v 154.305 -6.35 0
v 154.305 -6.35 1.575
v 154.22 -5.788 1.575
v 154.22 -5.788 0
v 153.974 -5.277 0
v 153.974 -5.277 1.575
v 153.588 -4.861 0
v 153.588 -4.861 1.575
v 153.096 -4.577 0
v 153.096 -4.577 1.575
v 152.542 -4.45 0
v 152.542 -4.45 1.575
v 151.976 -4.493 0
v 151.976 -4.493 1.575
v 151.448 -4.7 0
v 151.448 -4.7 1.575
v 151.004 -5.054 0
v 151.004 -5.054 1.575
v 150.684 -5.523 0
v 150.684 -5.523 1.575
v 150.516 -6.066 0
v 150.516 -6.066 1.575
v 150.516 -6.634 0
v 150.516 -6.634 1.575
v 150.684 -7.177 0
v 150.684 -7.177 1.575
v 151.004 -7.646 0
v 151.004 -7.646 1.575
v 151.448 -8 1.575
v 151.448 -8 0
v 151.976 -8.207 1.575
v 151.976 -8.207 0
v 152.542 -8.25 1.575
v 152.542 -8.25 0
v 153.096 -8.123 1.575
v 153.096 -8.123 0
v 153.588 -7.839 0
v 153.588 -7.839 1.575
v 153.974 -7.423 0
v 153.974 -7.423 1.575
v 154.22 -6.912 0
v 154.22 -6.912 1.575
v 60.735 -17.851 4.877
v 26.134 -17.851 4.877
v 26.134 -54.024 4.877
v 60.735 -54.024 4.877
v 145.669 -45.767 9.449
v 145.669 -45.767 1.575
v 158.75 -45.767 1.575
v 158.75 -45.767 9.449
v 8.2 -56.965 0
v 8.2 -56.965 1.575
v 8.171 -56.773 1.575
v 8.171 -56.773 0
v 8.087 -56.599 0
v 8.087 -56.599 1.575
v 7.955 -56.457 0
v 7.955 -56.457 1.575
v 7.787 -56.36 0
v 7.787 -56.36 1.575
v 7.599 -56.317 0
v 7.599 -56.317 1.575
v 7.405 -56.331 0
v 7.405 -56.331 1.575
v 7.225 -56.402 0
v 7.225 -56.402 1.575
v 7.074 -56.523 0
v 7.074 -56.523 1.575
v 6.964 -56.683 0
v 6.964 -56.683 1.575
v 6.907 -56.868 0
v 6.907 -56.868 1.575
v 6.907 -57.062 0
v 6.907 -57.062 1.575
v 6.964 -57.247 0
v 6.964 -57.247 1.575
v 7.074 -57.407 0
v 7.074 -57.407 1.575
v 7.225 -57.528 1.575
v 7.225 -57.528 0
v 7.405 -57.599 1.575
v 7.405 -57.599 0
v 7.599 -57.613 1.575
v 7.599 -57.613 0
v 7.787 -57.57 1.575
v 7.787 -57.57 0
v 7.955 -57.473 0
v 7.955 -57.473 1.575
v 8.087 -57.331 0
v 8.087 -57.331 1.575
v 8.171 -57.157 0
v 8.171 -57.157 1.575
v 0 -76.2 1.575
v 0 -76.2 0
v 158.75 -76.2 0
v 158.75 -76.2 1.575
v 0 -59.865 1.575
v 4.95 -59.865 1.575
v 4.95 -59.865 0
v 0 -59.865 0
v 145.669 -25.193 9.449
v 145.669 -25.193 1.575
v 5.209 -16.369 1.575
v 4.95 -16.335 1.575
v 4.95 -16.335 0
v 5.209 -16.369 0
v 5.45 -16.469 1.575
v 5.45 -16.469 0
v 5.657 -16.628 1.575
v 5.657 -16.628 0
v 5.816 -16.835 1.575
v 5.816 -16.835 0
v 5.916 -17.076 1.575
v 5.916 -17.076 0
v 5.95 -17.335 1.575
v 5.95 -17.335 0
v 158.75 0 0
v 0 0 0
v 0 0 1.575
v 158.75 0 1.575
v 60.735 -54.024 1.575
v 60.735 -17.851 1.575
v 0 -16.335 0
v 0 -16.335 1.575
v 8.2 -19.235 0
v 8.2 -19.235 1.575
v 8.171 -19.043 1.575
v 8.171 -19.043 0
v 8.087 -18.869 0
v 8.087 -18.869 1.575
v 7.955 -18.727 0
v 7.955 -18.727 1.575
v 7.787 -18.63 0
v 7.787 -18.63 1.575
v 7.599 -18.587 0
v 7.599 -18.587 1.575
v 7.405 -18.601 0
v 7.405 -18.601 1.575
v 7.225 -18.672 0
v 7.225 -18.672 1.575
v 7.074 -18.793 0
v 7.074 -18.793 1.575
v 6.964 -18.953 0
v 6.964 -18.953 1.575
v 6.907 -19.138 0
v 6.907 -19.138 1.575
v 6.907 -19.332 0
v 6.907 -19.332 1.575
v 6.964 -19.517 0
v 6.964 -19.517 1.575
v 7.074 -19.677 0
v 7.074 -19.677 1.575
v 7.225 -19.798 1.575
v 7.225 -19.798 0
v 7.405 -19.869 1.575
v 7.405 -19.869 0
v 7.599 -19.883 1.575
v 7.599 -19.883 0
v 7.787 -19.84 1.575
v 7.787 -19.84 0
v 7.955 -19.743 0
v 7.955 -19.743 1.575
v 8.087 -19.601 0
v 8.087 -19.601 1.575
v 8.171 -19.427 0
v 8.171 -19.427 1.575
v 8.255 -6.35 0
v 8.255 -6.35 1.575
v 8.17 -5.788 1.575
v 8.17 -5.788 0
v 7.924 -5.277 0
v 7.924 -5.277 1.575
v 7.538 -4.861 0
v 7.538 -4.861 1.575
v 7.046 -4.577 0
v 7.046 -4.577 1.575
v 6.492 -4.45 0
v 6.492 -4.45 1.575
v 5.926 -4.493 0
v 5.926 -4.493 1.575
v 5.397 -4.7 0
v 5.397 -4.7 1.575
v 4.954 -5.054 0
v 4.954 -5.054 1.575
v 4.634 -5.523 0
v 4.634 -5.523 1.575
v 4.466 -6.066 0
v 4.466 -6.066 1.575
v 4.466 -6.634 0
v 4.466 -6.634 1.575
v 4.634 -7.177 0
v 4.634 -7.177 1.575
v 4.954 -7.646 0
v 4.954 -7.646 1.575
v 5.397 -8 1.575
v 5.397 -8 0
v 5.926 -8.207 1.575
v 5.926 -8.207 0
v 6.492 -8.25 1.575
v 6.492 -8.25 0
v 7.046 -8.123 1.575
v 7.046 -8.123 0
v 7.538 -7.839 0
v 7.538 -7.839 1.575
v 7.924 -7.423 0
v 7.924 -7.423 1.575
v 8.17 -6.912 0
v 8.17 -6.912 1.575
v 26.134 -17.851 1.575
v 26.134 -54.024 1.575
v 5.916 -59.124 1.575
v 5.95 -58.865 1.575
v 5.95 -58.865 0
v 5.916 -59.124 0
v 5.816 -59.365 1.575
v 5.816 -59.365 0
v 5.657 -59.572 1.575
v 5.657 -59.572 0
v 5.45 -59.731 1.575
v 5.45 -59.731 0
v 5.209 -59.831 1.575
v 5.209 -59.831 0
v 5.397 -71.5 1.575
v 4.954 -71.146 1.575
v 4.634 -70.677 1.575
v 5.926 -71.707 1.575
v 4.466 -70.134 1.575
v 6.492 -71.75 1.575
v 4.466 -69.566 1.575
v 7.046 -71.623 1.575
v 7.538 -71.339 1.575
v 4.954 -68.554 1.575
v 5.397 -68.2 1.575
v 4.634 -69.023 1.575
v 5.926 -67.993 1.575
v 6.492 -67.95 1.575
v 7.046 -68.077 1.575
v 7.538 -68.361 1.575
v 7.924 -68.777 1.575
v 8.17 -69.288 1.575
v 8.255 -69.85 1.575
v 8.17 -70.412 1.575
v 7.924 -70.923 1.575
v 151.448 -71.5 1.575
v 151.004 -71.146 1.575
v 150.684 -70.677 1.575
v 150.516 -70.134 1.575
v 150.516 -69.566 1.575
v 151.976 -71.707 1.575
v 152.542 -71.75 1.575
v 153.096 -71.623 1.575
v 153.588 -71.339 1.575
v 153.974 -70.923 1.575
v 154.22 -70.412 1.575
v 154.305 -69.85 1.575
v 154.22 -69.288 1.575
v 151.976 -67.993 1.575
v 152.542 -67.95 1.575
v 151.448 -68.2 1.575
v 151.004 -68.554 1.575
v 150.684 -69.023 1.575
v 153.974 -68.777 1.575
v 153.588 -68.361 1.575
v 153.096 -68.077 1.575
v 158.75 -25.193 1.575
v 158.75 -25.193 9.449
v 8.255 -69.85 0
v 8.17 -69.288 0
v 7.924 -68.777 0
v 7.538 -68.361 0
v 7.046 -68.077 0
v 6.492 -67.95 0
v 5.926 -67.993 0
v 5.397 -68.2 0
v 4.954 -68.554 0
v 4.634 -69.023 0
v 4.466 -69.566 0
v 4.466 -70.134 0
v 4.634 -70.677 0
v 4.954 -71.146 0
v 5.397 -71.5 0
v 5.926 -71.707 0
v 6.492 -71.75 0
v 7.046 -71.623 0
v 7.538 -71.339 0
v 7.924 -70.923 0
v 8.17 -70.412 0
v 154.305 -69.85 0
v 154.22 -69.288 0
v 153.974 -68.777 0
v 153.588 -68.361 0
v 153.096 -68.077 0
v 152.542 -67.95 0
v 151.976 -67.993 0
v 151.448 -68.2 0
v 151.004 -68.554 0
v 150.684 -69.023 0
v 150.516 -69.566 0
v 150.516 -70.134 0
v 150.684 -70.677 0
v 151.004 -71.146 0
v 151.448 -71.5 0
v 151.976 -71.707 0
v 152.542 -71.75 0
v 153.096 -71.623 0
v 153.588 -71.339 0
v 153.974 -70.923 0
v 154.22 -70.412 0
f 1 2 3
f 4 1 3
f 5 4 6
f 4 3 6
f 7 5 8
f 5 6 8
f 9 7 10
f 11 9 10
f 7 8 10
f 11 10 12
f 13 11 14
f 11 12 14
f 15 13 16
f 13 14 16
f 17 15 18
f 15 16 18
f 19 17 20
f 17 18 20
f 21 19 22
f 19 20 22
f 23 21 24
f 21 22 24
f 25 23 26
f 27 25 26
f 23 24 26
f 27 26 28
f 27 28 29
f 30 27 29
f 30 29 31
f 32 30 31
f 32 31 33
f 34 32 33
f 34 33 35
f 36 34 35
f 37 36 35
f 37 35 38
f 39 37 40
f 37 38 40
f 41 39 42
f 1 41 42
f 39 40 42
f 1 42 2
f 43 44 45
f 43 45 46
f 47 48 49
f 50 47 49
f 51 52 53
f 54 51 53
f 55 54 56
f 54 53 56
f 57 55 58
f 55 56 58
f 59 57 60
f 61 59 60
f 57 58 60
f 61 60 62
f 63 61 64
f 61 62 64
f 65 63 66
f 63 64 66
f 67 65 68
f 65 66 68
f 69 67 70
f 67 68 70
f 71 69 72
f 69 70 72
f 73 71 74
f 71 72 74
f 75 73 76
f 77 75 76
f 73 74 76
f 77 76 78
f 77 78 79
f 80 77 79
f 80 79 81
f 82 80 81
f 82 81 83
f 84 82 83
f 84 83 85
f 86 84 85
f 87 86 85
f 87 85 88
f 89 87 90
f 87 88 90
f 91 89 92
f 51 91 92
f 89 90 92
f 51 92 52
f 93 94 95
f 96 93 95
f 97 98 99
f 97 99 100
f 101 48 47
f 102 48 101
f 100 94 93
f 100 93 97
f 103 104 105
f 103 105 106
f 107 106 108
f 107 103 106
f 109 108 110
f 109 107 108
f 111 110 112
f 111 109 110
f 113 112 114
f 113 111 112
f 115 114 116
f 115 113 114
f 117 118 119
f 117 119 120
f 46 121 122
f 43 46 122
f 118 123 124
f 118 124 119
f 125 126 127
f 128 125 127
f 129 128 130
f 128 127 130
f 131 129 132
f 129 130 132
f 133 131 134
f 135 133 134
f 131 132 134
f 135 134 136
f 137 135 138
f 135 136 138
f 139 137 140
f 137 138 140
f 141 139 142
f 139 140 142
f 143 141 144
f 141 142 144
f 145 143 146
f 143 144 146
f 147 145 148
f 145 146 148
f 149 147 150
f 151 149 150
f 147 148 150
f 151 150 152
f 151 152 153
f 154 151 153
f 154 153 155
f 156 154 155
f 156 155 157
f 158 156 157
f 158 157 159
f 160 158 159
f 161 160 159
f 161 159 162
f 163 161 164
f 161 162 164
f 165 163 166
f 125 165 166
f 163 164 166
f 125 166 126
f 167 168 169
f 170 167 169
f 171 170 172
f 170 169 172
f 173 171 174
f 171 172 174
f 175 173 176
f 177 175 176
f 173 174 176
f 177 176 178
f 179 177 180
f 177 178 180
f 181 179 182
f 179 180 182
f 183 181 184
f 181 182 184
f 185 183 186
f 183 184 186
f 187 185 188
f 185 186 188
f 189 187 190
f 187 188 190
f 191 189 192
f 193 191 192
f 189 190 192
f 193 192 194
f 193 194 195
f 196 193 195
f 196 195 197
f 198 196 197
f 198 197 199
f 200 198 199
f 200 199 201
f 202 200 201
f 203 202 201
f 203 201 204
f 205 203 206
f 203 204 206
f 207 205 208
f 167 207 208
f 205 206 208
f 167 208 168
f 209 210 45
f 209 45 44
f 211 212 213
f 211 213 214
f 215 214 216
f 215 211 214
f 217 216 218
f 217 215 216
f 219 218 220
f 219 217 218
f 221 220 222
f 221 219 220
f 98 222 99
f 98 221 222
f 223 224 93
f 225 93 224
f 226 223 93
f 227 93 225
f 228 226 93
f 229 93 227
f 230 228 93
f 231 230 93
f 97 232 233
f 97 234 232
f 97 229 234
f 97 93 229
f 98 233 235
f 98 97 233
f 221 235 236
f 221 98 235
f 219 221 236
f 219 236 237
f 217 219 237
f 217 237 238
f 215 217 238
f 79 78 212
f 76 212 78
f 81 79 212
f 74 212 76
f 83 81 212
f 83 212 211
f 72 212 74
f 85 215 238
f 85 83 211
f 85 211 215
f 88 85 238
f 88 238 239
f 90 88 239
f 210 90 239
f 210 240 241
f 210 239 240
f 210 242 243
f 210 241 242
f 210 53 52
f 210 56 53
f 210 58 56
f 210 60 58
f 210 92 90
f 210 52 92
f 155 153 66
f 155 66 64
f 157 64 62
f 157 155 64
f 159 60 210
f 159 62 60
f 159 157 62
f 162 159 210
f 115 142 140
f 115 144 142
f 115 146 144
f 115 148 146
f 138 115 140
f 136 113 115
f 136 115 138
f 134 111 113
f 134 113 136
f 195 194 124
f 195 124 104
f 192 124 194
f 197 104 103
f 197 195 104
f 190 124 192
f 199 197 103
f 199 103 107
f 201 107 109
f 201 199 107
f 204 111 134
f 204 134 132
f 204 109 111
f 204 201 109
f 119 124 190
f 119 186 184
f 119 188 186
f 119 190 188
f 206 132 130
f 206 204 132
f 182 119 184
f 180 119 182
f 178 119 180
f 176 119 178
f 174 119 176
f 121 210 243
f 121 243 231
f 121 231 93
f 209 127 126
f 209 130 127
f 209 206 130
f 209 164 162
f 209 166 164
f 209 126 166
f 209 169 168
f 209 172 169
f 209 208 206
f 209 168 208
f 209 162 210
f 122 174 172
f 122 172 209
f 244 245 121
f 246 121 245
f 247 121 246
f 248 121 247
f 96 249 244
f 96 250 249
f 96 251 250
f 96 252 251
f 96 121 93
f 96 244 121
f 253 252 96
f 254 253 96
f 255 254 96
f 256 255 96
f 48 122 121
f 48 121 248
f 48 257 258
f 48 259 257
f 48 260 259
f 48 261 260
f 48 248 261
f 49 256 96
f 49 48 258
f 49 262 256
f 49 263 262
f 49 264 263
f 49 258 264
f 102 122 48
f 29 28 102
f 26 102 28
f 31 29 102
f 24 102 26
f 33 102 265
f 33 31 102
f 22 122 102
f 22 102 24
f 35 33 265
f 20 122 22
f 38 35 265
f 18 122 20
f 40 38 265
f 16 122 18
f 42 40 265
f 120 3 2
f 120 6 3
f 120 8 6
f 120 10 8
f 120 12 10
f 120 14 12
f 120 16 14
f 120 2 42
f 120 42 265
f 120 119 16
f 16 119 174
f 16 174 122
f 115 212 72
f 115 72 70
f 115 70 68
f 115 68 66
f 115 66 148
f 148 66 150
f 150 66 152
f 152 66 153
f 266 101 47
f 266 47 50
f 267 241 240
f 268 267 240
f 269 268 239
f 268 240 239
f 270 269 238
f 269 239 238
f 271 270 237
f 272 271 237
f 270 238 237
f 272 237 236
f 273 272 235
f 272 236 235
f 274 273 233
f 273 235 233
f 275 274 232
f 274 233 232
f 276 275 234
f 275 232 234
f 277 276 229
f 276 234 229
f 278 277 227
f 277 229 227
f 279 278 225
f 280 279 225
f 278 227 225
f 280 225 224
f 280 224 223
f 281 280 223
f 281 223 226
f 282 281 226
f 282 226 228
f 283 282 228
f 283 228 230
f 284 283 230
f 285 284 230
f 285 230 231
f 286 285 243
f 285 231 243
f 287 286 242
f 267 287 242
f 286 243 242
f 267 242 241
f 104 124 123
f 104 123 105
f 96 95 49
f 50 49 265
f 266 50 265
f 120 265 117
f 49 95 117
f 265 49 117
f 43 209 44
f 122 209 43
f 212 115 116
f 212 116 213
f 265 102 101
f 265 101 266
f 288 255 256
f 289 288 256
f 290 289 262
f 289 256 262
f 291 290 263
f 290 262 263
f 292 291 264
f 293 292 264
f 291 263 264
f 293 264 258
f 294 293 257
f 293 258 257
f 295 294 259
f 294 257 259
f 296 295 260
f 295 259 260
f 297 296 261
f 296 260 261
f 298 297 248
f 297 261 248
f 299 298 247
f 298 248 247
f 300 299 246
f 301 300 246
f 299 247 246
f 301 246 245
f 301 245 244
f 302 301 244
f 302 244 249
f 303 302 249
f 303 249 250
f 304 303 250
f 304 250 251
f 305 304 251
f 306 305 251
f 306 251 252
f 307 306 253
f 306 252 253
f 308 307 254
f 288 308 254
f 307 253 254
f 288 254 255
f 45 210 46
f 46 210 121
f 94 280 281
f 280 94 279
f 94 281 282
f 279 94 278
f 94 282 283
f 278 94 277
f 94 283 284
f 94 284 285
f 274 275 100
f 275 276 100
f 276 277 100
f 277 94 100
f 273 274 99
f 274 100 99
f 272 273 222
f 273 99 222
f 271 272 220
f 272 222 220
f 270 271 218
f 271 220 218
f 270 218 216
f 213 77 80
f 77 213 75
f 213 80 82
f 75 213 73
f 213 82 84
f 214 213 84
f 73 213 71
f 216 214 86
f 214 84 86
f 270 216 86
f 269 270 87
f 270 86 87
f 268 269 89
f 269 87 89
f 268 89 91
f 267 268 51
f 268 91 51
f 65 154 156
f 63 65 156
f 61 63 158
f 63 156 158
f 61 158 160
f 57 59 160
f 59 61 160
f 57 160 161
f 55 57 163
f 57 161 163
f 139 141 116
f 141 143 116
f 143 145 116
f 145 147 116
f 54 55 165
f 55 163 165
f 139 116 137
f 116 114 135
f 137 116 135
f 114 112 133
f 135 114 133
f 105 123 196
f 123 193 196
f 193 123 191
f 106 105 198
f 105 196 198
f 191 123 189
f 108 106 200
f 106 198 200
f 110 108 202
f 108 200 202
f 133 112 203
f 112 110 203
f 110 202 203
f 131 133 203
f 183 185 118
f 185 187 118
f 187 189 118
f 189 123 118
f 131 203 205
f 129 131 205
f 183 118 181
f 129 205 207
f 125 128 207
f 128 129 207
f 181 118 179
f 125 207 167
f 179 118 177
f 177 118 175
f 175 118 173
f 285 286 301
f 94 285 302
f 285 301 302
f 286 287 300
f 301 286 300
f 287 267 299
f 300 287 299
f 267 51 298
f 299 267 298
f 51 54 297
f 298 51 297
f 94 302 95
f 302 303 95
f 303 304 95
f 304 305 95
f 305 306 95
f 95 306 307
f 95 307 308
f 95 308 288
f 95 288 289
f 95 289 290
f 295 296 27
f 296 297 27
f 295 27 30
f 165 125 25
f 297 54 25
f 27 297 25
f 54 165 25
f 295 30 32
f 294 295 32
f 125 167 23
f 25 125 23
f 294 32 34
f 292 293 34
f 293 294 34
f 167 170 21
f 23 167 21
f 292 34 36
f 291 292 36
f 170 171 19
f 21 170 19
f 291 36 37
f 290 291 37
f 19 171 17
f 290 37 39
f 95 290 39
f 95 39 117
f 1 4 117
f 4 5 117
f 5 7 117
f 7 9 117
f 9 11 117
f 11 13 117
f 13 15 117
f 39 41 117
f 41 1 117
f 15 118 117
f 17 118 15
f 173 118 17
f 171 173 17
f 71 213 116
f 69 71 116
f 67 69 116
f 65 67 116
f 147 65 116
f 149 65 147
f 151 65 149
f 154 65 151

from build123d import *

# Parameters (mm, degrees)
SKETCH1_W          = 158.75
SKETCH1_H          = 76.2
EXTRUDE1_DEPTH     = 1.5748
SKETCH2_R          = 1.905
CUT_EXTRUDE2_DEPTH = 1.5748
SKETCH4_R          = 0.65
CUT_EXTRUDE3_DEPTH = 1.5748
SKETCH5_W          = 34.600619195
SKETCH5_H          = 36.173374613
EXTRUDE2_DEPTH     = 3.302
SKETCH6_W          = 13.081
SKETCH6_H          = 20.574
EXTRUDE3_DEPTH     = 7.874


with BuildPart() as part:
    # Sketch1 → Extrude1 (new body)
    with BuildSketch(Plane.XY):
        with Locations((79.375, -38.1)):
            Rectangle(SKETCH1_W, SKETCH1_H)
    extrude(amount=EXTRUDE1_DEPTH)

    # Sketch2 → Cut-Extrude2 (cut)
    with BuildSketch(Plane.XY.offset(1.5748)):
        with Locations((152.4, -6.35)):
            Circle(SKETCH2_R)
        with Locations((6.35, -6.35)):
            Circle(SKETCH2_R)
        with Locations((152.4, -69.85)):
            Circle(SKETCH2_R)
        with Locations((6.35, -69.85)):
            Circle(SKETCH2_R)
    extrude(amount=-CUT_EXTRUDE2_DEPTH, mode=Mode.SUBTRACT)

    # Sketch4 → Cut-Extrude3 (cut)
    with BuildSketch(Plane.XY.offset(1.5748)):
        with Locations((7.55, -19.234912)):
            Circle(SKETCH4_R)
        with Locations((7.55, -56.965088)):
            Circle(SKETCH4_R)
        with BuildLine():
            Line((0, -16.335006), (4.95, -16.335006))
            ThreePointArc((4.95, -16.335006), (5.657106781, -16.627899219), (5.95, -17.335006))
            Line((5.95, -17.335006), (5.95, -58.865006))
            ThreePointArc((5.95, -58.865006), (5.657106781, -59.572112781), (4.95, -59.865006))
            Line((4.95, -59.865006), (0, -59.865006))
            Line((0, -59.865006), (0, -16.335006))
        make_face()
    extrude(amount=-CUT_EXTRUDE3_DEPTH, mode=Mode.SUBTRACT)

    # Sketch5 → Extrude2 (add)
    with BuildSketch(Plane.XY.offset(1.5748)):
        with Locations((43.434262125, -35.937461301)):
            Rectangle(SKETCH5_W, SKETCH5_H)
    extrude(amount=EXTRUDE2_DEPTH)

    # Sketch6 → Extrude3 (add)
    with BuildSketch(Plane.XY.offset(1.5748)):
        with Locations((152.2095, -35.480182663)):
            Rectangle(SKETCH6_W, SKETCH6_H)
    extrude(amount=EXTRUDE3_DEPTH)


solid = part.part
